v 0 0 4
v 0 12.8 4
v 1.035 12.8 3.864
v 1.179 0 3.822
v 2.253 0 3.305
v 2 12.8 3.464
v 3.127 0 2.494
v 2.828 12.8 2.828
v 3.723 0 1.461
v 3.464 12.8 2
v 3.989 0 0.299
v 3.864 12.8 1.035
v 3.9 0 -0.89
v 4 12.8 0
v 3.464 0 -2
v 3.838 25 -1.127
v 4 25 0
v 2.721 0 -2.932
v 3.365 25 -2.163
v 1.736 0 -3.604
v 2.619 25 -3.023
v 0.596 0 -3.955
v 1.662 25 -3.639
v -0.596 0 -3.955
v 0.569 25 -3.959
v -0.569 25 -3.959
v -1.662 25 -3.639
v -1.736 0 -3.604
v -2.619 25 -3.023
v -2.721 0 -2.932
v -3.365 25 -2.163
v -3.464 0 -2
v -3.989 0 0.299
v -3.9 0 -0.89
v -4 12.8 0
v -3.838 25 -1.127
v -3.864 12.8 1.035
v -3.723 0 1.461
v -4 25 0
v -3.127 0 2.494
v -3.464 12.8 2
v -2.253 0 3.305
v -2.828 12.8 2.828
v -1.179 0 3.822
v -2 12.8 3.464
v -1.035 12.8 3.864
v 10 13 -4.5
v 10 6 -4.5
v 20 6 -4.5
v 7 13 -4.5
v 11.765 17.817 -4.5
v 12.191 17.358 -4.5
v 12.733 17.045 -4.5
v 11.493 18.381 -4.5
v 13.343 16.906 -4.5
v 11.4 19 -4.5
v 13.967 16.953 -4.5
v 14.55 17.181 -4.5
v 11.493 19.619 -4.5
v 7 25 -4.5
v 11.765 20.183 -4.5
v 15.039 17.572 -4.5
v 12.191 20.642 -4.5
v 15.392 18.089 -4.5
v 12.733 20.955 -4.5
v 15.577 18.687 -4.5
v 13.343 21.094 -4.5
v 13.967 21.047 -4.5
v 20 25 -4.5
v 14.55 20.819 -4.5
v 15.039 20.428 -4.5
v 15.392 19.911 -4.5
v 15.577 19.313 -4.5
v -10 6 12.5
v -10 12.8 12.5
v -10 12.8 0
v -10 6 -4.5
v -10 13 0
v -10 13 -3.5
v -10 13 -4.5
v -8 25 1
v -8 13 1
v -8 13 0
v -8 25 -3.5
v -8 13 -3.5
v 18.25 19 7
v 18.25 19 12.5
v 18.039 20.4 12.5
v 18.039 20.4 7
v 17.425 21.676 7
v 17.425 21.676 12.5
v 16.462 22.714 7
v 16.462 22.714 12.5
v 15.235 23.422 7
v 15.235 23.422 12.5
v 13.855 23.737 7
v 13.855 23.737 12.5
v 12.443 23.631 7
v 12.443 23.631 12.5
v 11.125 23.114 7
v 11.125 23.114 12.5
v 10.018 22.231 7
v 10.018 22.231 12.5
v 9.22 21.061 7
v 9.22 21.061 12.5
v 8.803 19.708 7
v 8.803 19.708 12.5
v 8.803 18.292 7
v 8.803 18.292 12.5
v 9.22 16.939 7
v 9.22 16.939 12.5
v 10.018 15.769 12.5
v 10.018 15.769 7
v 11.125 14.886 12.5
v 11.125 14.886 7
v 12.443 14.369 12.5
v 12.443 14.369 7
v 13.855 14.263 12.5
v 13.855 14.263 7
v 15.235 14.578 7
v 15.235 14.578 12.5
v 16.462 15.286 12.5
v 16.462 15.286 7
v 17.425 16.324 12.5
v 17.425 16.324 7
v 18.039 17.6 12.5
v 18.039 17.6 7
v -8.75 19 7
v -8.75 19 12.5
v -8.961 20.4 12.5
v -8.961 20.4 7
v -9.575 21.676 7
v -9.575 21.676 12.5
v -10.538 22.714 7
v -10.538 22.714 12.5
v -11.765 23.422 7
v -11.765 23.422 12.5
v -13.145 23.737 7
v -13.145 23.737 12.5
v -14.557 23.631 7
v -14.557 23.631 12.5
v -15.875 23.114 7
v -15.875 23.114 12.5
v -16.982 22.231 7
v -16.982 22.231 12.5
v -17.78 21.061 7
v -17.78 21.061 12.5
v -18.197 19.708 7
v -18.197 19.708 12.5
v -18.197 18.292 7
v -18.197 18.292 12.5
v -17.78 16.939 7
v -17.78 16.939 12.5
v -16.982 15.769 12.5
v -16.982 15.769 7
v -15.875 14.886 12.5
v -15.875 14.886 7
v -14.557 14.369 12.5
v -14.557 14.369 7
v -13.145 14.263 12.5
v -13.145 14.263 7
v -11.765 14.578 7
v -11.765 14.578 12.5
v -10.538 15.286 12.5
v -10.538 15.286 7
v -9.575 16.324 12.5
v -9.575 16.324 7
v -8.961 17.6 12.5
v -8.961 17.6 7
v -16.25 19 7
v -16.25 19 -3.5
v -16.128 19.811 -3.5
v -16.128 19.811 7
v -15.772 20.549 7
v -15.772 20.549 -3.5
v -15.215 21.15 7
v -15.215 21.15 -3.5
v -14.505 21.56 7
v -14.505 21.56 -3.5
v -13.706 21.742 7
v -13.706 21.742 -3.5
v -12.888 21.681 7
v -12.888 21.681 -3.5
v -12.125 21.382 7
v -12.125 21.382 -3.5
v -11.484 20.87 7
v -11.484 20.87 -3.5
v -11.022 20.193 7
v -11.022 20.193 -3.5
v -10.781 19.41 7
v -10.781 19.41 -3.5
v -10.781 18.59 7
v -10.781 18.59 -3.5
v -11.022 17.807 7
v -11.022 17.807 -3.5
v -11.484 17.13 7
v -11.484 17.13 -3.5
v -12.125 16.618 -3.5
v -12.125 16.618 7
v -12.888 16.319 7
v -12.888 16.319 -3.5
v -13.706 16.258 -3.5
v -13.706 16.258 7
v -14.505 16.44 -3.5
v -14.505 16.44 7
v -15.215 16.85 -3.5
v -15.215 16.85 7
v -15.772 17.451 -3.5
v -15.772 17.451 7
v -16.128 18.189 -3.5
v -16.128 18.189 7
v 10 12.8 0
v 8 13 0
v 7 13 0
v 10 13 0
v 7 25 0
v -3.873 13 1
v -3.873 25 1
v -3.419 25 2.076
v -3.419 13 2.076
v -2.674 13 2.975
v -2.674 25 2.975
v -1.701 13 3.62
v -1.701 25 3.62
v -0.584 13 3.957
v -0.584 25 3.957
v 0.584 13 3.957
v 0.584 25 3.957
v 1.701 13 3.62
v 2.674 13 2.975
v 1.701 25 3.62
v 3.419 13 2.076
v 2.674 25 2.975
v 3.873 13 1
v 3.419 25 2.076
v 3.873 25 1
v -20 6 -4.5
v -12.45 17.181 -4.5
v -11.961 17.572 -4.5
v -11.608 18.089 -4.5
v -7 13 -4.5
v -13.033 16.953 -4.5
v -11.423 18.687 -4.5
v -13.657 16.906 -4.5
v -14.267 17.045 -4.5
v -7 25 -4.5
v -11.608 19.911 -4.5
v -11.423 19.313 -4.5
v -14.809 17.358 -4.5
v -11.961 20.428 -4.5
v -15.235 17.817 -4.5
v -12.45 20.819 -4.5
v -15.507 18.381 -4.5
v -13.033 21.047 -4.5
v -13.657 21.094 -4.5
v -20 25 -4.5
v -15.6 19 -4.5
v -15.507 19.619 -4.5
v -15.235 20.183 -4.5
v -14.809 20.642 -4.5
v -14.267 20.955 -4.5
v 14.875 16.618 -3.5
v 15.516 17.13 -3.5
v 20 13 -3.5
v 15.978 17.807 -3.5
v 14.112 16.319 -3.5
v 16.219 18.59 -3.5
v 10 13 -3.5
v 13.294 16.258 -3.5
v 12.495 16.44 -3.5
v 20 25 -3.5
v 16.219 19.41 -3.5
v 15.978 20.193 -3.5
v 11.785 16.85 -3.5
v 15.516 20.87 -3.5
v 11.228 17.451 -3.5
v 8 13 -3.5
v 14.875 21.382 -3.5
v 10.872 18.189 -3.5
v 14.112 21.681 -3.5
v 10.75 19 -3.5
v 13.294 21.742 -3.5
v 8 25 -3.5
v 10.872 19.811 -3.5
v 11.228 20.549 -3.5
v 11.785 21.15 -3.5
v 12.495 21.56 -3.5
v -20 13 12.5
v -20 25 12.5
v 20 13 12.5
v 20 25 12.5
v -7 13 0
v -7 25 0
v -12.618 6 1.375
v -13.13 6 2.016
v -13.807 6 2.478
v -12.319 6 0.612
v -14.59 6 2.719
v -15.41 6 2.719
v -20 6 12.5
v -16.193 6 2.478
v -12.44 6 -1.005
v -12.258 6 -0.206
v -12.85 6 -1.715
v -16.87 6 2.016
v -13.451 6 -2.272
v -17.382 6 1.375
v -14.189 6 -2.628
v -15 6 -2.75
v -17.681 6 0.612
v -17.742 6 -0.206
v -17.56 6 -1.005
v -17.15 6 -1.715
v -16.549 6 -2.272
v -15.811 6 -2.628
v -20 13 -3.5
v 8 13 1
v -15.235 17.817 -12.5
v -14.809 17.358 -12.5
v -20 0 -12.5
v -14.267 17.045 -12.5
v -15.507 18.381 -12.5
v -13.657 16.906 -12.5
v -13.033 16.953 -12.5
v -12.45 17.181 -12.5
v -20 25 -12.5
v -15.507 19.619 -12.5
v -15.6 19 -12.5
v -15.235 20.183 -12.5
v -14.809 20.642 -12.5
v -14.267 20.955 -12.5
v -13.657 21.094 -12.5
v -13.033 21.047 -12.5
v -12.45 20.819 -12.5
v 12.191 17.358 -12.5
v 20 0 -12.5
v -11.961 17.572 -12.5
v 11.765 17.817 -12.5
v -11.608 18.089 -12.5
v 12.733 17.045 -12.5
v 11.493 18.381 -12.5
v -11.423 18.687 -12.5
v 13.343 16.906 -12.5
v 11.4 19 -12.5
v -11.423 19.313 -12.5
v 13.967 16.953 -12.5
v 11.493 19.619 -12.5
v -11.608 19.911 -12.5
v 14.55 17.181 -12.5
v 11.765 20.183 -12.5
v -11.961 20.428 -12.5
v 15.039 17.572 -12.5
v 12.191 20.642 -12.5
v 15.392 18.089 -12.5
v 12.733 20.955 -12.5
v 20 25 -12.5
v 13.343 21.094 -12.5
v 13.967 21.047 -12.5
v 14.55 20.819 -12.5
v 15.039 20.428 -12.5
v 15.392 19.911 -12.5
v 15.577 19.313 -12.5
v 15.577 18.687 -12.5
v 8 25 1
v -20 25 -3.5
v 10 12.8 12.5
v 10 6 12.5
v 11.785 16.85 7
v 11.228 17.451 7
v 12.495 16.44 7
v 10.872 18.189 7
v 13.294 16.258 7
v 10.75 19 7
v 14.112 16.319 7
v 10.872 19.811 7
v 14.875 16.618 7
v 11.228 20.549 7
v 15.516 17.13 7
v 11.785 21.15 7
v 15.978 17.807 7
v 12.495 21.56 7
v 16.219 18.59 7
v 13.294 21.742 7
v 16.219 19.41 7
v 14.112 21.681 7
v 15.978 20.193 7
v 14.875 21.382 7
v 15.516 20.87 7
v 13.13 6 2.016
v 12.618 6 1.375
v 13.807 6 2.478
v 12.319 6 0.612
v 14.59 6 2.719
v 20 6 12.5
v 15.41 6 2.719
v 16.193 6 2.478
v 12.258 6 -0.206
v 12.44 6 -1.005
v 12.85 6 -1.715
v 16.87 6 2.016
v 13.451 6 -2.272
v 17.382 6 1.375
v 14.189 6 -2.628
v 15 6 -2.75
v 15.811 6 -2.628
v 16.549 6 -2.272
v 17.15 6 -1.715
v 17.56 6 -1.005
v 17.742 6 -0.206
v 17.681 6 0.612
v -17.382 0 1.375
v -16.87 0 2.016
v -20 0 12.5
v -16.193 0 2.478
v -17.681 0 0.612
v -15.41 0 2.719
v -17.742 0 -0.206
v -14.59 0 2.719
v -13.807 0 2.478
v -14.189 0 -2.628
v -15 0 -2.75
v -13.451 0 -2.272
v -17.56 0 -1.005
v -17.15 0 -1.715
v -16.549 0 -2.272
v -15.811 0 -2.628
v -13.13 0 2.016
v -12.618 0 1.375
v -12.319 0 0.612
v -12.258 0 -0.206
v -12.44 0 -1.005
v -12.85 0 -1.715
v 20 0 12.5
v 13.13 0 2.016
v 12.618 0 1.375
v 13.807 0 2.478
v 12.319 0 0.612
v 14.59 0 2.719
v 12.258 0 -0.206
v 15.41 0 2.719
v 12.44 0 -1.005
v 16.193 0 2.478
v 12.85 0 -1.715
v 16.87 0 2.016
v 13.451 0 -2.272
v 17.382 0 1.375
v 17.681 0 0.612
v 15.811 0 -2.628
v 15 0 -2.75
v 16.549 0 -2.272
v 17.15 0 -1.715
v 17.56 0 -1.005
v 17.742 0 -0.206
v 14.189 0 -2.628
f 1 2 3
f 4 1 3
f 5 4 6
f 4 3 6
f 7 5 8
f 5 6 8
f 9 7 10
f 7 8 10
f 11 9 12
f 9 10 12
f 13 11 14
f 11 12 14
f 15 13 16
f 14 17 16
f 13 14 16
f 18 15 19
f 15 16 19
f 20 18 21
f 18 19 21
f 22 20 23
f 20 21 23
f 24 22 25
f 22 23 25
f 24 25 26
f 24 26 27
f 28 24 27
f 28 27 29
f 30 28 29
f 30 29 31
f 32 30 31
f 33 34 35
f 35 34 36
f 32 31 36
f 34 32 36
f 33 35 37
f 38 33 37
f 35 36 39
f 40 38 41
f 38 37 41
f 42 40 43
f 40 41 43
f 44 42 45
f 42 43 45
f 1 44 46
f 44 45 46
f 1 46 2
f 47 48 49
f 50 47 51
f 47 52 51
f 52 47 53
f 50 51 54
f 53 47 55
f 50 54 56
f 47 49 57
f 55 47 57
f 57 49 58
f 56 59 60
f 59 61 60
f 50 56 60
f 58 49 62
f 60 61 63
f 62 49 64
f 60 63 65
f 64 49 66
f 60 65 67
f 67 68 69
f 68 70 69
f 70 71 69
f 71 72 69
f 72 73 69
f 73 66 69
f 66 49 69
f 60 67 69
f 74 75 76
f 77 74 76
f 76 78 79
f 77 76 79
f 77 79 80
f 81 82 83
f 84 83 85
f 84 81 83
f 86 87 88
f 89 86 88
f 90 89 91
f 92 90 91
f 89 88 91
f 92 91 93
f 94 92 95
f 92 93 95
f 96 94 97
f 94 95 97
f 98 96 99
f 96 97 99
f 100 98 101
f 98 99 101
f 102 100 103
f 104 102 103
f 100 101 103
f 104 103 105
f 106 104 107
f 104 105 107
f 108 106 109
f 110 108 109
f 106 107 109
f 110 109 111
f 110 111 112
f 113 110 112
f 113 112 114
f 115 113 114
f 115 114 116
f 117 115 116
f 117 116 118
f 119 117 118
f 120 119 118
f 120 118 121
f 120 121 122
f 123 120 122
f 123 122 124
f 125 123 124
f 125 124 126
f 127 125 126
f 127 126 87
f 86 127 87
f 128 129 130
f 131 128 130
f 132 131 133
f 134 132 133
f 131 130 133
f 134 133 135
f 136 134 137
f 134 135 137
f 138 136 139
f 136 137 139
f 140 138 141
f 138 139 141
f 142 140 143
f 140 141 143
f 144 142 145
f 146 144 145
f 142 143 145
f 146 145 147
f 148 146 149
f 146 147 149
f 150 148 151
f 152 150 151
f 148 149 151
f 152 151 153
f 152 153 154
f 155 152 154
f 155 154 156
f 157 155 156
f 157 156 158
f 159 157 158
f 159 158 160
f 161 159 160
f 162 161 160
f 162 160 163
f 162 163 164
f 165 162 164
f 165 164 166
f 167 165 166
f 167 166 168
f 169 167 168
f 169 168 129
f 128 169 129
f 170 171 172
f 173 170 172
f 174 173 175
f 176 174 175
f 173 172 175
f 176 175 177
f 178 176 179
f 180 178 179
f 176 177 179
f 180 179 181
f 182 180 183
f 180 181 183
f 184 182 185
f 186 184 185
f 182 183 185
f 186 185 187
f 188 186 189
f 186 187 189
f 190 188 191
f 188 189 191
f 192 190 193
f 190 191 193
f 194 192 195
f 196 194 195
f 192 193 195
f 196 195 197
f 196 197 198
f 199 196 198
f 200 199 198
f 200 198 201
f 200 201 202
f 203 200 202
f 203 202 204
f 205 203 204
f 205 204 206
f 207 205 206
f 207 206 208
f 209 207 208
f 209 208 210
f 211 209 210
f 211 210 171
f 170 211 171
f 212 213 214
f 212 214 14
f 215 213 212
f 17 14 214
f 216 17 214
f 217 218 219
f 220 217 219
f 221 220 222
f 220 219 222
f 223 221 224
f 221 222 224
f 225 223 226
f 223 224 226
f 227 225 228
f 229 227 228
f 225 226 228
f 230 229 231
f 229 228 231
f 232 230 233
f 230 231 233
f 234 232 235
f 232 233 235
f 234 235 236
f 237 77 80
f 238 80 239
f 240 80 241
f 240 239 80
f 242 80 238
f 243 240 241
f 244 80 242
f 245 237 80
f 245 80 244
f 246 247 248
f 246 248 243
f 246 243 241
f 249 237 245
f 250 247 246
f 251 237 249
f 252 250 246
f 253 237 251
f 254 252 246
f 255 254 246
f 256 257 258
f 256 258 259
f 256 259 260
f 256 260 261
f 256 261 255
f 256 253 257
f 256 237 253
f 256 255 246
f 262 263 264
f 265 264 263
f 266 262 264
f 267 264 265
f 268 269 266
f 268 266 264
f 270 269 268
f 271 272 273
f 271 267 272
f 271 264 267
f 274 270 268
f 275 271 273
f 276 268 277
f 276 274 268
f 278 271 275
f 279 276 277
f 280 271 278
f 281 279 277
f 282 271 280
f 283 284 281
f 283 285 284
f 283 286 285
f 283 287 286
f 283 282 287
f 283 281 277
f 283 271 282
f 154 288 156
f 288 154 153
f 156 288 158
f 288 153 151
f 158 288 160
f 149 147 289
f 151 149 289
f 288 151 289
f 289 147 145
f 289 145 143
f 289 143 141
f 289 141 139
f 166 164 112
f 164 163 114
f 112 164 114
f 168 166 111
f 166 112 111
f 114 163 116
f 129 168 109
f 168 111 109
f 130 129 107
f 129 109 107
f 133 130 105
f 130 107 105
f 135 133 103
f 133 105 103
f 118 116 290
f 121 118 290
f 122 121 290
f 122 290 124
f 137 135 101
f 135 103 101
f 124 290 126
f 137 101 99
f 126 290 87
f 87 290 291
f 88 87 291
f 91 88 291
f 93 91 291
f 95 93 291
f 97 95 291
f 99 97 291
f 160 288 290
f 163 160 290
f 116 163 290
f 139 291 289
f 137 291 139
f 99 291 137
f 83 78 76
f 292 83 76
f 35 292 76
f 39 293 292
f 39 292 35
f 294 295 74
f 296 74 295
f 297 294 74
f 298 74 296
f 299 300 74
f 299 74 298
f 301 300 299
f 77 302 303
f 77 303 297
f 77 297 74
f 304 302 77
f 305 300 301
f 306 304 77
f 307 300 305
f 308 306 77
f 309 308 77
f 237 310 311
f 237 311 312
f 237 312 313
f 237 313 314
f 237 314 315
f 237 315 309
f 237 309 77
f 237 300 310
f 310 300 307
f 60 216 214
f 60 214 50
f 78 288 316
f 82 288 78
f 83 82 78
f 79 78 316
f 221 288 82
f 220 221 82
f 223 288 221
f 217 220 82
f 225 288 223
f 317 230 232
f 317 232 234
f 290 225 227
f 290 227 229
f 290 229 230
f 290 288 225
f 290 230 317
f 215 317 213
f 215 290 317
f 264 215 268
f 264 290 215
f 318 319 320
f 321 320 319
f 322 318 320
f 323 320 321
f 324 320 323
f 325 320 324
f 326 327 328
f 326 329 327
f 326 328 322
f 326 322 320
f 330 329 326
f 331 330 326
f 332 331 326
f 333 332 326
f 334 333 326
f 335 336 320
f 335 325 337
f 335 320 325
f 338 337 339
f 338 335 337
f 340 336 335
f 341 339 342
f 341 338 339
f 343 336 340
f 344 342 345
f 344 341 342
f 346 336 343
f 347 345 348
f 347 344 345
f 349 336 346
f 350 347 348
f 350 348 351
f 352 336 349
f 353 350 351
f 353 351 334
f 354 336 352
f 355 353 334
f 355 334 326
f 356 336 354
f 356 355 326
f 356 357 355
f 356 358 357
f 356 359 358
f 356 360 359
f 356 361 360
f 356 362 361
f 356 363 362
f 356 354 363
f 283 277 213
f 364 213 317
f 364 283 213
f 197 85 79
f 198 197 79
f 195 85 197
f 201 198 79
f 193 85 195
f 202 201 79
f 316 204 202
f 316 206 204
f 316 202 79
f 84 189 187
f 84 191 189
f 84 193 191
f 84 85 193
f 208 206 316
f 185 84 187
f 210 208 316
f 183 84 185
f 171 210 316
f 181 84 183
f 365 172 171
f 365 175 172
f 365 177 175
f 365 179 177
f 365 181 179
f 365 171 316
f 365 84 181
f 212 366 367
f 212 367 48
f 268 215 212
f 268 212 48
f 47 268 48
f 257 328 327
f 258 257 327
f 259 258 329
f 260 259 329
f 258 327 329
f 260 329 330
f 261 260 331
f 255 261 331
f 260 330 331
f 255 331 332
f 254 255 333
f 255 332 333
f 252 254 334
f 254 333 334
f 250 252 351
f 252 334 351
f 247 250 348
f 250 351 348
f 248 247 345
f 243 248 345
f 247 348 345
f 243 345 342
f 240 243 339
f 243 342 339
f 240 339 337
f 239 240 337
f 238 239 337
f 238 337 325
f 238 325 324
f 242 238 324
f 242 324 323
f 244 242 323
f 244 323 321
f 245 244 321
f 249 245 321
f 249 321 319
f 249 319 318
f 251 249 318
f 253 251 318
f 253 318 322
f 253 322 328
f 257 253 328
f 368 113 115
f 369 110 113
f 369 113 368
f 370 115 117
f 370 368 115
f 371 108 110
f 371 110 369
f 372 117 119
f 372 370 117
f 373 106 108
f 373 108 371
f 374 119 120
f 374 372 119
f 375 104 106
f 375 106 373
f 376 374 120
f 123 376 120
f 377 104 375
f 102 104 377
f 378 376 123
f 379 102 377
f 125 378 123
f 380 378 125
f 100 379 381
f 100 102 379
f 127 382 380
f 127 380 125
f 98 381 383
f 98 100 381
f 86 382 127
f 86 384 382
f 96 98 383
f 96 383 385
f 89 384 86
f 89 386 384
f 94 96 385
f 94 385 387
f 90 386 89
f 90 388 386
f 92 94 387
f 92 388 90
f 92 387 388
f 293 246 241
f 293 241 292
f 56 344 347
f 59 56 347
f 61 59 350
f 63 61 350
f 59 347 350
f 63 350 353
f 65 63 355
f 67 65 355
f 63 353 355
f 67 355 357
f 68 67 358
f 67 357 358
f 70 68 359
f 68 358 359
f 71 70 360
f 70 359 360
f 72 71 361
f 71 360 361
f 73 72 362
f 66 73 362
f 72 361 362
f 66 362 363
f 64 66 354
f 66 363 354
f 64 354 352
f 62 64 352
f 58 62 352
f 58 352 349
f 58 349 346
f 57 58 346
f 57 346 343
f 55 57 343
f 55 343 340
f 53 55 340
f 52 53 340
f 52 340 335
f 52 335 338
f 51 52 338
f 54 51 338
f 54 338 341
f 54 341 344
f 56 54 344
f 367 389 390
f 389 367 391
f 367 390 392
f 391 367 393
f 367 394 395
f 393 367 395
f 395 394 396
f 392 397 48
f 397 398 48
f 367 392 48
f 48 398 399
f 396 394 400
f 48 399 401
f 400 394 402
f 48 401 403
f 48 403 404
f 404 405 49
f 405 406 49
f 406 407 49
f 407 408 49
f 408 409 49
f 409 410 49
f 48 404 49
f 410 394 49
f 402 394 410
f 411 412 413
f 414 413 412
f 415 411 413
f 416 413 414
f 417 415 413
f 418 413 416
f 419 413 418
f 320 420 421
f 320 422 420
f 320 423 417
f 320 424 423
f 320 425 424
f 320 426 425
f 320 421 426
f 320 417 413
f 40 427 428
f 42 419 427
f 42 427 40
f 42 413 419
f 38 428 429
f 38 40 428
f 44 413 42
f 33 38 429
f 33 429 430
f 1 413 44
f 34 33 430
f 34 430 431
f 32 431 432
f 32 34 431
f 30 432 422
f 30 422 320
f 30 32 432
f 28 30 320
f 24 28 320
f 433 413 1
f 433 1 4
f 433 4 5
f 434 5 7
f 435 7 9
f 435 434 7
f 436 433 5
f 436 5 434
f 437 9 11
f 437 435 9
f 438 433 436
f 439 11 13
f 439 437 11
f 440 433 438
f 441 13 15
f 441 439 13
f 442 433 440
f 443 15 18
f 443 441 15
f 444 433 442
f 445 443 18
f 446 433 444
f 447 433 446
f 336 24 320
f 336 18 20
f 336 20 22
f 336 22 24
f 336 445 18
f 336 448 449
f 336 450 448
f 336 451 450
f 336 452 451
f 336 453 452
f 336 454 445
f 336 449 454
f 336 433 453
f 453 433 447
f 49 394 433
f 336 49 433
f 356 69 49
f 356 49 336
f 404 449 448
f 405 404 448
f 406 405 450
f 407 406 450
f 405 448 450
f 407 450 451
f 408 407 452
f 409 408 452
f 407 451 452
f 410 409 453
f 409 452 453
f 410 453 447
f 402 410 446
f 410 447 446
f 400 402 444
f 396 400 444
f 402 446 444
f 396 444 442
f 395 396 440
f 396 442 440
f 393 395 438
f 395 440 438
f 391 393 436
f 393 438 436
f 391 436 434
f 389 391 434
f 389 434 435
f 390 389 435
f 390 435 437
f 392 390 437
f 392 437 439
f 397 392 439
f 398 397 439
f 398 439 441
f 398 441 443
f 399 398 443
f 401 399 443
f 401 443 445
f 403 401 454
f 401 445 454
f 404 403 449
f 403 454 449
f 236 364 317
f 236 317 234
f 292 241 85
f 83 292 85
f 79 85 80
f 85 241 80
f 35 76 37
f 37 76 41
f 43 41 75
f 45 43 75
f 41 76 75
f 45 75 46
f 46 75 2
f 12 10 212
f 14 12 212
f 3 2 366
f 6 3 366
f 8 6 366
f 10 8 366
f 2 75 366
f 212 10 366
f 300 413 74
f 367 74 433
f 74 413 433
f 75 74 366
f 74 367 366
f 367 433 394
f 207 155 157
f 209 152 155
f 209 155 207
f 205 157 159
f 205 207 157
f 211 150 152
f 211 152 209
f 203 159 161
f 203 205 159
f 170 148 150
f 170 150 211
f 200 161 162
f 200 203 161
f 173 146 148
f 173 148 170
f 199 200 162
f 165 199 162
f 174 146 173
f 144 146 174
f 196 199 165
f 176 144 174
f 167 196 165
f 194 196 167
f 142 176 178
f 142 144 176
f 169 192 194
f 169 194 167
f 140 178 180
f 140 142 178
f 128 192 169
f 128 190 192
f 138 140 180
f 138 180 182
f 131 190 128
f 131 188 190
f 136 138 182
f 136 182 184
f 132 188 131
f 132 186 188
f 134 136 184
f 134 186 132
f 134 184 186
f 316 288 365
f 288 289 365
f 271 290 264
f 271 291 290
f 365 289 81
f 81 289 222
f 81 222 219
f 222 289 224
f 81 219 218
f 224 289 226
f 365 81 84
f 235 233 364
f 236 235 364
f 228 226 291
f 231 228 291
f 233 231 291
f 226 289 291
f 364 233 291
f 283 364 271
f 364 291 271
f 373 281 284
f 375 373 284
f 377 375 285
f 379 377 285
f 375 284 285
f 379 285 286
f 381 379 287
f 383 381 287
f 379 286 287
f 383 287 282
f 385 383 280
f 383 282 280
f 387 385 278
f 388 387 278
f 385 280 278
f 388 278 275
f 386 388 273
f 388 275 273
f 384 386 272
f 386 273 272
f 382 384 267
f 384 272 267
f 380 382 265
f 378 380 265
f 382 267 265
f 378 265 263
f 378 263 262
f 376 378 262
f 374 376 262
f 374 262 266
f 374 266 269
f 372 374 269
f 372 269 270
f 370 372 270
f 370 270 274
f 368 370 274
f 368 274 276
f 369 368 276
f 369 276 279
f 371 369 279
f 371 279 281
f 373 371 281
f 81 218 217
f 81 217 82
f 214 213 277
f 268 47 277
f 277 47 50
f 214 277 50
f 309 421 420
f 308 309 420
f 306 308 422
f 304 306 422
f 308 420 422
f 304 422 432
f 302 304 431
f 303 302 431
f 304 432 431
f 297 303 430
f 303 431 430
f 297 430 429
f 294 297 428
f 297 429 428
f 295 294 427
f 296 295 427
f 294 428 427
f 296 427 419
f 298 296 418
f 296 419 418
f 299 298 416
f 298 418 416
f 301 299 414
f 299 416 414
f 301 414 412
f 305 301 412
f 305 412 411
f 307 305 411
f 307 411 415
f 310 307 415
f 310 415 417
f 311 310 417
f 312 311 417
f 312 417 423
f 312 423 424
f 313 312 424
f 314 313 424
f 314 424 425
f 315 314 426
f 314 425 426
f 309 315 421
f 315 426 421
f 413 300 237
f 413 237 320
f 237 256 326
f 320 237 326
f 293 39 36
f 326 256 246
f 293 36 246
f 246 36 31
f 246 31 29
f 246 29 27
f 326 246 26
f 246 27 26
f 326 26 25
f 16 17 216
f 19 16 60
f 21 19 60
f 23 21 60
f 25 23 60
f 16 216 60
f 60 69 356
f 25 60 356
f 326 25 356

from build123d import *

# Parameters (mm, degrees)
SKETCH_2_W                = 25
SKETCH_2_H                = 25
EXTRUDE_2_DEPTH           = 20
SKETCH_8_W                = 17
SKETCH_8_H                = 7
CUT_EXTRUDE_5_DEPTH       = 10
CUT_EXTRUDE_6_DEPTH       = 12
SKETCH_13_W               = 20
SKETCH_13_H               = 0.2
CUT_EXTRUDE_7_DEPTH       = 12.5
HOLE_WIZARD_1_D           = 5.5
HOLE_WIZARD_1_DEPTH       = 16
HOLE_WIZARD_1_CBORE_D     = 9.5
HOLE_WIZARD_1_CBORE_DEPTH = 5.5
M5X0_8_1_D                = 4.2
M5X0_8_1_DEPTH            = 12.4
M5X0_8_1_TIP              = 1.2618073
SKETCH_16_R               = 4
CUT_EXTRUDE_8_DEPTH       = 35.369317712
SKETCH_17_R               = 2.75
CUT_EXTRUDE_9_DEPTH       = 6


with BuildPart() as part:
    # 草图2 → 凸台-拉伸2 (new, symmetric)
    with BuildSketch(Plane(origin=(0, 0, 0), x_dir=(0, 0, -1), z_dir=(1, 0, 0))):
        with Locations((0, 12.5)):
            Rectangle(SKETCH_2_W, SKETCH_2_H)
    extrude(amount=EXTRUDE_2_DEPTH, both=True)

    # 草图8 → 切除-拉伸5 (cut)
    with BuildSketch(Plane(origin=(20, 0, 0), x_dir=(0, 0, -1), z_dir=(1, 0, 0))):
        with Locations((-4, 9.5)):
            Rectangle(SKETCH_8_W, SKETCH_8_H)
    cut_extrude_5 = extrude(amount=-CUT_EXTRUDE_5_DEPTH, mode=Mode.SUBTRACT)

    # 镜向1: 切除-拉伸5 across plane
    add(cut_extrude_5.mirror(Plane(origin=(0, 0, 0), x_dir=(0, 0, 1), z_dir=(1, 0, 0))), mode=Mode.SUBTRACT)

    # 草图12 → 切除-拉伸6 (cut)
    with BuildSketch(Plane(origin=(0, 25, 0), x_dir=(1, 0, 0), z_dir=(0, 1, 0))):
        Polygon((-20, 4.5), (-7, 4.5), (-7, 0), (7, 0), (7, 4.5), (20, 4.5), (20, 3.5), (8, 3.5), (8, -1), (-8, -1), (-8, 3.5), (-20, 3.5), align=None)
    extrude(amount=-CUT_EXTRUDE_6_DEPTH, mode=Mode.SUBTRACT)

    # 草图13 → 切除-拉伸7 (cut)
    with BuildSketch(Plane.XY.offset(12.5)):
        with Locations((0, 12.9)):
            Rectangle(SKETCH_13_W, SKETCH_13_H)
    extrude(amount=-CUT_EXTRUDE_7_DEPTH, mode=Mode.SUBTRACT)

    # 孔1
    with Locations(Plane.XY.offset(12.5)):
        with Locations((-13.5, 19), (13.5, 19)):
            CounterBoreHole(HOLE_WIZARD_1_D / 2, HOLE_WIZARD_1_CBORE_D / 2, HOLE_WIZARD_1_CBORE_DEPTH, depth=HOLE_WIZARD_1_DEPTH)

    # M5x0.8 螺纹孔1
    with Locations(Plane.XY.offset(-4.5)):
        with Locations((-13.5, 19), (13.5, 19)):
            Hole(M5X0_8_1_D / 2, depth=M5X0_8_1_DEPTH)
            with Locations((0, 0, -(M5X0_8_1_DEPTH + M5X0_8_1_TIP / 2))):  # 118° drill point
                Cone(0, M5X0_8_1_D / 2, M5X0_8_1_TIP, mode=Mode.SUBTRACT)

    # 草图16 → 切除-拉伸8 (cut, through all)
    with BuildSketch(Plane(origin=(0, 25, 0), x_dir=(1, 0, 0), z_dir=(0, 1, 0))):
        with Locations(Location((0, 0, 0), (0, 0, 270))):
            Circle(SKETCH_16_R)
    extrude(amount=-CUT_EXTRUDE_8_DEPTH, mode=Mode.SUBTRACT)

    # 草图17 → 切除-拉伸9 (cut)
    with BuildSketch(Plane.XZ):
        with Locations(Location((-15, 0, 0), (0, 0, 270))):
            Circle(SKETCH_17_R)
        with Locations(Location((15, 0, 0), (0, 0, 270))):
            Circle(SKETCH_17_R)
    extrude(amount=-CUT_EXTRUDE_9_DEPTH, mode=Mode.SUBTRACT)


solid = part.part
